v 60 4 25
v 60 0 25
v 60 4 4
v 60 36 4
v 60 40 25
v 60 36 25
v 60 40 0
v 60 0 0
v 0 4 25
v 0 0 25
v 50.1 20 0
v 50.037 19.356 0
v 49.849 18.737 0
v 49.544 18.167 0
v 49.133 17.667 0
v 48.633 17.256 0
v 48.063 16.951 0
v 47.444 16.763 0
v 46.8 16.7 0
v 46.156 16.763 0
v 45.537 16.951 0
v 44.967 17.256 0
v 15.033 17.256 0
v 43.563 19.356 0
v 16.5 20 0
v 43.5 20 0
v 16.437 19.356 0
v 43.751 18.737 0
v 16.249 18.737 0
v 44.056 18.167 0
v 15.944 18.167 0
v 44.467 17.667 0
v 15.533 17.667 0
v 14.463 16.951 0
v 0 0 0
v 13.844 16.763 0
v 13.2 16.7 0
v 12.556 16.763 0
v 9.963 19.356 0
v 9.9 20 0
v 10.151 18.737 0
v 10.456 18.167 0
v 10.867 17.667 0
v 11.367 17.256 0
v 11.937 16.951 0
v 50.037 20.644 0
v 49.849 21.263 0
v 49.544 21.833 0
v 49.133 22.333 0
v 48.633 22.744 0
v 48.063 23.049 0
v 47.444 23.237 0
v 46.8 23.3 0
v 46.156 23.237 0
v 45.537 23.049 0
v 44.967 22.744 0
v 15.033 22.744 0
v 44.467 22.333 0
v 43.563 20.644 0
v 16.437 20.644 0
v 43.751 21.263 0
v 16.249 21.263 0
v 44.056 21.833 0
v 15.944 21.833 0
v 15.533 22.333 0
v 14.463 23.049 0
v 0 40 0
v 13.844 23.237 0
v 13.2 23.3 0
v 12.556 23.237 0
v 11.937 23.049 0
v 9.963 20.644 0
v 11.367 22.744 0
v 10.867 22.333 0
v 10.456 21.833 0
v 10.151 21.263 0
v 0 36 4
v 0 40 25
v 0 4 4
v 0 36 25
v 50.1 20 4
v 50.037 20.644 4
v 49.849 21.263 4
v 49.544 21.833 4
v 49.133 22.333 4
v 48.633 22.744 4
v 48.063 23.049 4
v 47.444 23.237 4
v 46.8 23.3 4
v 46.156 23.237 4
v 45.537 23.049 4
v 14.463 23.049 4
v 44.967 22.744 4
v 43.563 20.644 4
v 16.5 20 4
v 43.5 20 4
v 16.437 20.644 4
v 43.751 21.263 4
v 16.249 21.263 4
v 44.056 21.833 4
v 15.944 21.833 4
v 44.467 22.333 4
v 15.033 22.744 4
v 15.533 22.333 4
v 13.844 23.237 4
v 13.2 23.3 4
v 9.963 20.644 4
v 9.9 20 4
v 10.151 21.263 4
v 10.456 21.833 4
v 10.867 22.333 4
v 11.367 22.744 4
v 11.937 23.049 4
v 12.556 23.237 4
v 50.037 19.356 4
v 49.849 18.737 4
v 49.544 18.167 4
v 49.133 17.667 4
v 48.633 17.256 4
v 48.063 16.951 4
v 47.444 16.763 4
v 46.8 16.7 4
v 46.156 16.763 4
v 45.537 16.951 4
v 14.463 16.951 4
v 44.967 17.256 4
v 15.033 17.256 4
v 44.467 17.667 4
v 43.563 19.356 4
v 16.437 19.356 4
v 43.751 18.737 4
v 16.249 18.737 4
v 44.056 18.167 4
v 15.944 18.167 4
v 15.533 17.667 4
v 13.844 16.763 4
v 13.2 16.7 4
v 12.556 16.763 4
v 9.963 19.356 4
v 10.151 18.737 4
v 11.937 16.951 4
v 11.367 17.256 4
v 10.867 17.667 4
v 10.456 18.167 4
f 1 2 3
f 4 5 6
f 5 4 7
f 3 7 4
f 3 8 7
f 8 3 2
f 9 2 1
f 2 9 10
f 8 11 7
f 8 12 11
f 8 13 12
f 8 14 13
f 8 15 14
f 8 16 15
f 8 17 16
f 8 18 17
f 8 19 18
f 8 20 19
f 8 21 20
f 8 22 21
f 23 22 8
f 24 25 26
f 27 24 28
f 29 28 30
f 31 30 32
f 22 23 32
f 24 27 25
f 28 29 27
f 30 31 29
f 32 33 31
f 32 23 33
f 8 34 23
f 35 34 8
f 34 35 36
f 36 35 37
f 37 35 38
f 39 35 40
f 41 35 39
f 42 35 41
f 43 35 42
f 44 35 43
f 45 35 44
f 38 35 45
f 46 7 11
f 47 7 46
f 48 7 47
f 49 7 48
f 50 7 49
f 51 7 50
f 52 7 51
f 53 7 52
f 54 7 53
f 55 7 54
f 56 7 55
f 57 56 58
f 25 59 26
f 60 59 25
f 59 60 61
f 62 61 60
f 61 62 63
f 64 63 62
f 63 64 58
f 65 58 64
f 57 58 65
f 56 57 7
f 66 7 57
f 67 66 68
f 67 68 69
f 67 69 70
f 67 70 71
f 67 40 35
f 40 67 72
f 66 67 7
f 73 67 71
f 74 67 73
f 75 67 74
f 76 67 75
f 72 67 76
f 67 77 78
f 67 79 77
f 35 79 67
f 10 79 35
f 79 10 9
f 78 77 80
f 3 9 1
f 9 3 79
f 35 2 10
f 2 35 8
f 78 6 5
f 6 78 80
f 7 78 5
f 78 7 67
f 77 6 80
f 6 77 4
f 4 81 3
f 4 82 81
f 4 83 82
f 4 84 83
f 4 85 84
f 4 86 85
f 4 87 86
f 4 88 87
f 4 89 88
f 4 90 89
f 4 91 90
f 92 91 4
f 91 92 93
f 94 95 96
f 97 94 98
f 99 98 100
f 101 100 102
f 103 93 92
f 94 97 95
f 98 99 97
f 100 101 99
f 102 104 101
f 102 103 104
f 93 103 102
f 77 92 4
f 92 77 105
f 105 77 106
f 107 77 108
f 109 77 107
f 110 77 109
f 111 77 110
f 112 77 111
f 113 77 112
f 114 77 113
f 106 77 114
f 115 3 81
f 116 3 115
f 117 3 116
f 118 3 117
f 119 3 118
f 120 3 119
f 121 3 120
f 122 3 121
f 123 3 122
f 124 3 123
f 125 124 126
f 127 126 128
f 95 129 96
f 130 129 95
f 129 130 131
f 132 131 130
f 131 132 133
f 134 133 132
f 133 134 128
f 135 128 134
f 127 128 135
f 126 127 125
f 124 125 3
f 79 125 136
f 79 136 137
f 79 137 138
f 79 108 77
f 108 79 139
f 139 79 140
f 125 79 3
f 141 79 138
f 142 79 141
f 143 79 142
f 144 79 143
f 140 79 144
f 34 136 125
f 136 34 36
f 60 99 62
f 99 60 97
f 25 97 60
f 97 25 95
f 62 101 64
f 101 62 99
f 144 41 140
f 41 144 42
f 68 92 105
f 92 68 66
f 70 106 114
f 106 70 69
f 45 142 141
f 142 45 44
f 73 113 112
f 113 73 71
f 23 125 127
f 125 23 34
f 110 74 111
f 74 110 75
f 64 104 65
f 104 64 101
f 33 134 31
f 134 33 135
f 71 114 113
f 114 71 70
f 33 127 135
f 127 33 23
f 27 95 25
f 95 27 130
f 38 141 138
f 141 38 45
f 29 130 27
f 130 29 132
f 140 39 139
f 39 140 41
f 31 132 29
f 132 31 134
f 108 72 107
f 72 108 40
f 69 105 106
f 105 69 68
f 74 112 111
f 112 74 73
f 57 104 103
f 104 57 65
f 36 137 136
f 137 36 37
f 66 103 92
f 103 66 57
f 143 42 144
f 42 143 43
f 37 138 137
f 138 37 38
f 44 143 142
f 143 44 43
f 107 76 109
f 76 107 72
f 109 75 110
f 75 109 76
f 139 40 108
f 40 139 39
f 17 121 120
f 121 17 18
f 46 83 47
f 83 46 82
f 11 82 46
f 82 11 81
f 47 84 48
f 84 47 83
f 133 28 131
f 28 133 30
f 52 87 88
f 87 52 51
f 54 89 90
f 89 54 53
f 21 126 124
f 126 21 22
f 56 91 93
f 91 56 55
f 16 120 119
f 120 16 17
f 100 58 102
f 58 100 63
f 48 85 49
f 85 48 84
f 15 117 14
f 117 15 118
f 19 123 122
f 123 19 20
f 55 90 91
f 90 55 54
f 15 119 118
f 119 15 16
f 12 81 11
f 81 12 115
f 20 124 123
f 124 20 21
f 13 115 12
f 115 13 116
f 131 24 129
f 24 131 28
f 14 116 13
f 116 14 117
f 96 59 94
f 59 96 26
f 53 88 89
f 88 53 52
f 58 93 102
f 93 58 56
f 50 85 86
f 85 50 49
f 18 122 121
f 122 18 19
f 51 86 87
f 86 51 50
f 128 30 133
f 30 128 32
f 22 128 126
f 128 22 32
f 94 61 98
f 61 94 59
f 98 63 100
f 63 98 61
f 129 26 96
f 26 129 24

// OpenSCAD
$fn = 32;

// ----------------------------------------------------------------------
// U-bracket: 60 x 40 x 25 mm
// ----------------------------------------------------------------------

// --- parameters (mm) ---
rail_len = 60;            // outer length, X
jaw_w = 40;               // outer width, Y
jaw_h = 25;               // upright height, Z
web_t = 4;                // wall thickness
hole_d = 6.6;             // clearance for M6

module hole_z(px, py) {
  translate([px, py, -0.5]) cylinder(h = web_t + 1, d = hole_d);
}
module hole_y_pz(pz) {
  /* through both uprights along Y */
  translate([0, -0.5, pz]) rotate([-90, 0, 0]) cylinder(h = jaw_w + 1, d = hole_d);
}

module base() {
  cube([rail_len, jaw_w, web_t]);
}

module uprights() {
  cube([rail_len, web_t, jaw_h]);
  translate([0, jaw_w - web_t, 0]) cube([rail_len, web_t, jaw_h]);
}

difference() {
  union() {
    base();
    uprights();
  }
  hole_z(13.2, 20);
  hole_z(46.8, 20);
}
